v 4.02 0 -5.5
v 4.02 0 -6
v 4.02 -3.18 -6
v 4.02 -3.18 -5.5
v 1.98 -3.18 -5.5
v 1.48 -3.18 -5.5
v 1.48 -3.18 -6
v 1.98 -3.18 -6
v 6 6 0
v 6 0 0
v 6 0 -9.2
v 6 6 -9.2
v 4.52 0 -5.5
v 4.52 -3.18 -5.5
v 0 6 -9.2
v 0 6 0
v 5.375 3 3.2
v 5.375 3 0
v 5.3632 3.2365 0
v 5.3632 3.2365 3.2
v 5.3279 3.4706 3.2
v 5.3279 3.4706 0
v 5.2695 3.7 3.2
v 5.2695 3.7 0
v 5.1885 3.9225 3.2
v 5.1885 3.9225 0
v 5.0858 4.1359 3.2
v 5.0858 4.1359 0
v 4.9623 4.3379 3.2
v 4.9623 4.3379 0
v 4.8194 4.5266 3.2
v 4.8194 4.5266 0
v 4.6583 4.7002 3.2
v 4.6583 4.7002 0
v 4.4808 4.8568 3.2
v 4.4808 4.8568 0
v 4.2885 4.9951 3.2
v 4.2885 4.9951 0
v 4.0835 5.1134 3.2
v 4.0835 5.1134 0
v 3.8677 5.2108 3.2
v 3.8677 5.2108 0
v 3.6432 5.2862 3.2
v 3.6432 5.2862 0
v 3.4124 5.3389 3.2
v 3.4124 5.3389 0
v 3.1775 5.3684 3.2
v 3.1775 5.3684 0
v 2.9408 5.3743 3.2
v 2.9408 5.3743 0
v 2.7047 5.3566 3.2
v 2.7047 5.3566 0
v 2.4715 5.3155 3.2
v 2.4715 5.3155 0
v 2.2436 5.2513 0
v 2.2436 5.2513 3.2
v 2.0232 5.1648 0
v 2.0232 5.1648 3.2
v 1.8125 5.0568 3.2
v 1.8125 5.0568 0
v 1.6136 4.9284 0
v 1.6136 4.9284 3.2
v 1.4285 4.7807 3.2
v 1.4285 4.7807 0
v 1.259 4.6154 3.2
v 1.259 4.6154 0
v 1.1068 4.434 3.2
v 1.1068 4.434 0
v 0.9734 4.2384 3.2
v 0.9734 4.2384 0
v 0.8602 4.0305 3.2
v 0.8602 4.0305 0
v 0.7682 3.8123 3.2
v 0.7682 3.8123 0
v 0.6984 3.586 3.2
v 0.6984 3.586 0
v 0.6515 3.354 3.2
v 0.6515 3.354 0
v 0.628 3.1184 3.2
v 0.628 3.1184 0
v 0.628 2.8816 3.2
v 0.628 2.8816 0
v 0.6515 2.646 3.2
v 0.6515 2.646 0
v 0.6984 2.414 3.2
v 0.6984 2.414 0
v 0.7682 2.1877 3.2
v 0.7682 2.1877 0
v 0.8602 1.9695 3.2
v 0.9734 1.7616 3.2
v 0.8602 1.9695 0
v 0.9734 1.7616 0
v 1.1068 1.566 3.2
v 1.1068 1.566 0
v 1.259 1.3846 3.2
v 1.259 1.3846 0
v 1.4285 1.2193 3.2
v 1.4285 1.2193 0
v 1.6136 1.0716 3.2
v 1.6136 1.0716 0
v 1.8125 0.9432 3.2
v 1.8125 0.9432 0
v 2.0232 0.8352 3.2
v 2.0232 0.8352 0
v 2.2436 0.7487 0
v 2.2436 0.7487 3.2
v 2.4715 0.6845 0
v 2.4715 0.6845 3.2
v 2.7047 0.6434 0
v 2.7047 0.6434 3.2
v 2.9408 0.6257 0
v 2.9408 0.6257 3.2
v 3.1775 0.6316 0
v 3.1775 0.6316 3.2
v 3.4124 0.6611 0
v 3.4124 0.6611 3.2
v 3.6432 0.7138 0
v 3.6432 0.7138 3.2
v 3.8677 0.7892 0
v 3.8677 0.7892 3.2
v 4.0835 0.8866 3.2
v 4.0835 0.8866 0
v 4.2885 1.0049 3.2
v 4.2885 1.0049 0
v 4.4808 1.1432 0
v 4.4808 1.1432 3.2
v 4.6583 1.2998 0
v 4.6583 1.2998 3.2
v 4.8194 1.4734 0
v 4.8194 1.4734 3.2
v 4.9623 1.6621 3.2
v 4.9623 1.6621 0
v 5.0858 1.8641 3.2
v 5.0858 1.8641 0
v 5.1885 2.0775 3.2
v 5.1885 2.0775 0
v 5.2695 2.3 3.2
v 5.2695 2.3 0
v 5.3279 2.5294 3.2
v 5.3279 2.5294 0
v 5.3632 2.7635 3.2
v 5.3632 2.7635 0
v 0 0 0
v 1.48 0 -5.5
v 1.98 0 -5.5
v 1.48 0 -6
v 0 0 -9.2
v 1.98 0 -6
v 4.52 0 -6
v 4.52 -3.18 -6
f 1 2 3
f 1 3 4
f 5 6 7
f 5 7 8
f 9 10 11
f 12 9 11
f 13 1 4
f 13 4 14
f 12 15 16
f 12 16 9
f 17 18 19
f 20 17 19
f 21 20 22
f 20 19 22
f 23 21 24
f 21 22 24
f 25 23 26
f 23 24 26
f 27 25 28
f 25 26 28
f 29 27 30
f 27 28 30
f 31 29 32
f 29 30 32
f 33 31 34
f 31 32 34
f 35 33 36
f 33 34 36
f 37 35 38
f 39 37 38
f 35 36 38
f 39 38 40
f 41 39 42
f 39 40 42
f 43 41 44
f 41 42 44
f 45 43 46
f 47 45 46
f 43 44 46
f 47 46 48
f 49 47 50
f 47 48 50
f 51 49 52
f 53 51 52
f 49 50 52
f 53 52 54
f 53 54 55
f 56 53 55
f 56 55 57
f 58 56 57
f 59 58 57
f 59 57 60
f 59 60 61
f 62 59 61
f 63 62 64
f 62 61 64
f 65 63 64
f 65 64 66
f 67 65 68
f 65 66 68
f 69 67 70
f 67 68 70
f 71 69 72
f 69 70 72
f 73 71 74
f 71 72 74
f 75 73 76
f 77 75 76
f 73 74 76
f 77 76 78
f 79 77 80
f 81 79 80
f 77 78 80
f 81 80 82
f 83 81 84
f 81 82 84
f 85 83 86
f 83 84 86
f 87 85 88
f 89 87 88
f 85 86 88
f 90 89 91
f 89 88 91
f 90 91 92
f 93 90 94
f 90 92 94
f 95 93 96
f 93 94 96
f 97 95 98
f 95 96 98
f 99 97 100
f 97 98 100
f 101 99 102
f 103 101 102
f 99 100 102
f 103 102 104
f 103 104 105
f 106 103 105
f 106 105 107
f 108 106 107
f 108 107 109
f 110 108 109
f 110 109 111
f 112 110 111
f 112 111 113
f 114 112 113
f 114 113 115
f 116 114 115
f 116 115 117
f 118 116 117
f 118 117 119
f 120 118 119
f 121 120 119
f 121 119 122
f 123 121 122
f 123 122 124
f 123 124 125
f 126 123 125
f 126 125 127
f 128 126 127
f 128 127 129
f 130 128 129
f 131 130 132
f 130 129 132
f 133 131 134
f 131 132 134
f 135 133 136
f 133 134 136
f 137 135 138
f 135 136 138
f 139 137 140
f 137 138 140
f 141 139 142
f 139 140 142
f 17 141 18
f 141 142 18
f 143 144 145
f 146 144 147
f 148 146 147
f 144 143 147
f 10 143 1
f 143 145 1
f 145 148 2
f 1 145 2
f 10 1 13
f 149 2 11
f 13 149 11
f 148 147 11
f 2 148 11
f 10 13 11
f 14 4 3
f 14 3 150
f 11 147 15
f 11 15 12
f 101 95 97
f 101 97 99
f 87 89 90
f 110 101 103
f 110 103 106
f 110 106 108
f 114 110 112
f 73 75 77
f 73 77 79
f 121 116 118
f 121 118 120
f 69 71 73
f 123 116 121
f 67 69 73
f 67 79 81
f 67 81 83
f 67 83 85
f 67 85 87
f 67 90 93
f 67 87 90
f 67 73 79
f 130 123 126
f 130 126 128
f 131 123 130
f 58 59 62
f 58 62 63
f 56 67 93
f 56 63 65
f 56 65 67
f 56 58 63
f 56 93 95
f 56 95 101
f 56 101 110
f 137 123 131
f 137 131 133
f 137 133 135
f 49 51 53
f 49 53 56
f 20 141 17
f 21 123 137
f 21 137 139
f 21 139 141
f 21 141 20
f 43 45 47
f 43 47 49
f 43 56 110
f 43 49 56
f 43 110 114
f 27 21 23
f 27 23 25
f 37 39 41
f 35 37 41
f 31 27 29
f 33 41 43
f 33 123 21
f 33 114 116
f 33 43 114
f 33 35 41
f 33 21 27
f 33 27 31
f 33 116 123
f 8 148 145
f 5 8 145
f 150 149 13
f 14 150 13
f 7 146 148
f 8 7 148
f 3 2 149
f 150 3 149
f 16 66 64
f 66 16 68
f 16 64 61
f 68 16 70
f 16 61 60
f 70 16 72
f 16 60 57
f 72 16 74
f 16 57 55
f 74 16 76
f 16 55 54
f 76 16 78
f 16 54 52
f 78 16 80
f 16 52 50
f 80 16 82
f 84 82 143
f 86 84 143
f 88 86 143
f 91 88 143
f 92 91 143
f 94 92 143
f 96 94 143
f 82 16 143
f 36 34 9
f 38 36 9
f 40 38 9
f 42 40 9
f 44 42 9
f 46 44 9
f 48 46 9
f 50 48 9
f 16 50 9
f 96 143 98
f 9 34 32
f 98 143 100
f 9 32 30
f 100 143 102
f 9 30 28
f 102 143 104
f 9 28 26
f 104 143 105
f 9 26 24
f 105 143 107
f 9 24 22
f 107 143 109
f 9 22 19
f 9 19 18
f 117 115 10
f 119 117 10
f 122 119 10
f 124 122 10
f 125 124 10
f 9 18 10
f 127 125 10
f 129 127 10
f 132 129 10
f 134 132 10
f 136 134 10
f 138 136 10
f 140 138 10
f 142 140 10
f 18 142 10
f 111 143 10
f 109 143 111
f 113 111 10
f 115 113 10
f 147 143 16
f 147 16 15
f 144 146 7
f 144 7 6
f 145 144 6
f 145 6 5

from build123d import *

# Parameters (mm, degrees)
SKETCH2_W           = 6
SKETCH2_H           = 9.2
BOSS_EXTRUDE1_DEPTH = 6
SKETCH3_R           = 2.375
BOSS_EXTRUDE2_DEPTH = 3.2
SKETCH4_W           = 0.5
SKETCH4_H           = 0.5
BOSS_EXTRUDE3_DEPTH = 3.18


with BuildPart() as part:
    # Sketch2 → Boss-Extrude1 (new body)
    with BuildSketch(Plane(origin=(0, 0, 0), x_dir=(1, 0, 0), z_dir=(0, 1, 0))):
        with Locations((3, 4.6)):
            Rectangle(SKETCH2_W, SKETCH2_H)
    extrude(amount=BOSS_EXTRUDE1_DEPTH)

    # Sketch3 → Boss-Extrude2 (add)
    with BuildSketch(Plane.XY):
        with Locations((3, 3)):
            Circle(SKETCH3_R)
    extrude(amount=BOSS_EXTRUDE2_DEPTH)

    # Sketch4 → Boss-Extrude3 (add)
    with BuildSketch(Plane.XZ):
        with Locations((1.73, -5.75)):
            Rectangle(SKETCH4_W, SKETCH4_H)
        with Locations((4.27, -5.75)):
            Rectangle(SKETCH4_W, SKETCH4_H)
    extrude(amount=BOSS_EXTRUDE3_DEPTH)


solid = part.part
